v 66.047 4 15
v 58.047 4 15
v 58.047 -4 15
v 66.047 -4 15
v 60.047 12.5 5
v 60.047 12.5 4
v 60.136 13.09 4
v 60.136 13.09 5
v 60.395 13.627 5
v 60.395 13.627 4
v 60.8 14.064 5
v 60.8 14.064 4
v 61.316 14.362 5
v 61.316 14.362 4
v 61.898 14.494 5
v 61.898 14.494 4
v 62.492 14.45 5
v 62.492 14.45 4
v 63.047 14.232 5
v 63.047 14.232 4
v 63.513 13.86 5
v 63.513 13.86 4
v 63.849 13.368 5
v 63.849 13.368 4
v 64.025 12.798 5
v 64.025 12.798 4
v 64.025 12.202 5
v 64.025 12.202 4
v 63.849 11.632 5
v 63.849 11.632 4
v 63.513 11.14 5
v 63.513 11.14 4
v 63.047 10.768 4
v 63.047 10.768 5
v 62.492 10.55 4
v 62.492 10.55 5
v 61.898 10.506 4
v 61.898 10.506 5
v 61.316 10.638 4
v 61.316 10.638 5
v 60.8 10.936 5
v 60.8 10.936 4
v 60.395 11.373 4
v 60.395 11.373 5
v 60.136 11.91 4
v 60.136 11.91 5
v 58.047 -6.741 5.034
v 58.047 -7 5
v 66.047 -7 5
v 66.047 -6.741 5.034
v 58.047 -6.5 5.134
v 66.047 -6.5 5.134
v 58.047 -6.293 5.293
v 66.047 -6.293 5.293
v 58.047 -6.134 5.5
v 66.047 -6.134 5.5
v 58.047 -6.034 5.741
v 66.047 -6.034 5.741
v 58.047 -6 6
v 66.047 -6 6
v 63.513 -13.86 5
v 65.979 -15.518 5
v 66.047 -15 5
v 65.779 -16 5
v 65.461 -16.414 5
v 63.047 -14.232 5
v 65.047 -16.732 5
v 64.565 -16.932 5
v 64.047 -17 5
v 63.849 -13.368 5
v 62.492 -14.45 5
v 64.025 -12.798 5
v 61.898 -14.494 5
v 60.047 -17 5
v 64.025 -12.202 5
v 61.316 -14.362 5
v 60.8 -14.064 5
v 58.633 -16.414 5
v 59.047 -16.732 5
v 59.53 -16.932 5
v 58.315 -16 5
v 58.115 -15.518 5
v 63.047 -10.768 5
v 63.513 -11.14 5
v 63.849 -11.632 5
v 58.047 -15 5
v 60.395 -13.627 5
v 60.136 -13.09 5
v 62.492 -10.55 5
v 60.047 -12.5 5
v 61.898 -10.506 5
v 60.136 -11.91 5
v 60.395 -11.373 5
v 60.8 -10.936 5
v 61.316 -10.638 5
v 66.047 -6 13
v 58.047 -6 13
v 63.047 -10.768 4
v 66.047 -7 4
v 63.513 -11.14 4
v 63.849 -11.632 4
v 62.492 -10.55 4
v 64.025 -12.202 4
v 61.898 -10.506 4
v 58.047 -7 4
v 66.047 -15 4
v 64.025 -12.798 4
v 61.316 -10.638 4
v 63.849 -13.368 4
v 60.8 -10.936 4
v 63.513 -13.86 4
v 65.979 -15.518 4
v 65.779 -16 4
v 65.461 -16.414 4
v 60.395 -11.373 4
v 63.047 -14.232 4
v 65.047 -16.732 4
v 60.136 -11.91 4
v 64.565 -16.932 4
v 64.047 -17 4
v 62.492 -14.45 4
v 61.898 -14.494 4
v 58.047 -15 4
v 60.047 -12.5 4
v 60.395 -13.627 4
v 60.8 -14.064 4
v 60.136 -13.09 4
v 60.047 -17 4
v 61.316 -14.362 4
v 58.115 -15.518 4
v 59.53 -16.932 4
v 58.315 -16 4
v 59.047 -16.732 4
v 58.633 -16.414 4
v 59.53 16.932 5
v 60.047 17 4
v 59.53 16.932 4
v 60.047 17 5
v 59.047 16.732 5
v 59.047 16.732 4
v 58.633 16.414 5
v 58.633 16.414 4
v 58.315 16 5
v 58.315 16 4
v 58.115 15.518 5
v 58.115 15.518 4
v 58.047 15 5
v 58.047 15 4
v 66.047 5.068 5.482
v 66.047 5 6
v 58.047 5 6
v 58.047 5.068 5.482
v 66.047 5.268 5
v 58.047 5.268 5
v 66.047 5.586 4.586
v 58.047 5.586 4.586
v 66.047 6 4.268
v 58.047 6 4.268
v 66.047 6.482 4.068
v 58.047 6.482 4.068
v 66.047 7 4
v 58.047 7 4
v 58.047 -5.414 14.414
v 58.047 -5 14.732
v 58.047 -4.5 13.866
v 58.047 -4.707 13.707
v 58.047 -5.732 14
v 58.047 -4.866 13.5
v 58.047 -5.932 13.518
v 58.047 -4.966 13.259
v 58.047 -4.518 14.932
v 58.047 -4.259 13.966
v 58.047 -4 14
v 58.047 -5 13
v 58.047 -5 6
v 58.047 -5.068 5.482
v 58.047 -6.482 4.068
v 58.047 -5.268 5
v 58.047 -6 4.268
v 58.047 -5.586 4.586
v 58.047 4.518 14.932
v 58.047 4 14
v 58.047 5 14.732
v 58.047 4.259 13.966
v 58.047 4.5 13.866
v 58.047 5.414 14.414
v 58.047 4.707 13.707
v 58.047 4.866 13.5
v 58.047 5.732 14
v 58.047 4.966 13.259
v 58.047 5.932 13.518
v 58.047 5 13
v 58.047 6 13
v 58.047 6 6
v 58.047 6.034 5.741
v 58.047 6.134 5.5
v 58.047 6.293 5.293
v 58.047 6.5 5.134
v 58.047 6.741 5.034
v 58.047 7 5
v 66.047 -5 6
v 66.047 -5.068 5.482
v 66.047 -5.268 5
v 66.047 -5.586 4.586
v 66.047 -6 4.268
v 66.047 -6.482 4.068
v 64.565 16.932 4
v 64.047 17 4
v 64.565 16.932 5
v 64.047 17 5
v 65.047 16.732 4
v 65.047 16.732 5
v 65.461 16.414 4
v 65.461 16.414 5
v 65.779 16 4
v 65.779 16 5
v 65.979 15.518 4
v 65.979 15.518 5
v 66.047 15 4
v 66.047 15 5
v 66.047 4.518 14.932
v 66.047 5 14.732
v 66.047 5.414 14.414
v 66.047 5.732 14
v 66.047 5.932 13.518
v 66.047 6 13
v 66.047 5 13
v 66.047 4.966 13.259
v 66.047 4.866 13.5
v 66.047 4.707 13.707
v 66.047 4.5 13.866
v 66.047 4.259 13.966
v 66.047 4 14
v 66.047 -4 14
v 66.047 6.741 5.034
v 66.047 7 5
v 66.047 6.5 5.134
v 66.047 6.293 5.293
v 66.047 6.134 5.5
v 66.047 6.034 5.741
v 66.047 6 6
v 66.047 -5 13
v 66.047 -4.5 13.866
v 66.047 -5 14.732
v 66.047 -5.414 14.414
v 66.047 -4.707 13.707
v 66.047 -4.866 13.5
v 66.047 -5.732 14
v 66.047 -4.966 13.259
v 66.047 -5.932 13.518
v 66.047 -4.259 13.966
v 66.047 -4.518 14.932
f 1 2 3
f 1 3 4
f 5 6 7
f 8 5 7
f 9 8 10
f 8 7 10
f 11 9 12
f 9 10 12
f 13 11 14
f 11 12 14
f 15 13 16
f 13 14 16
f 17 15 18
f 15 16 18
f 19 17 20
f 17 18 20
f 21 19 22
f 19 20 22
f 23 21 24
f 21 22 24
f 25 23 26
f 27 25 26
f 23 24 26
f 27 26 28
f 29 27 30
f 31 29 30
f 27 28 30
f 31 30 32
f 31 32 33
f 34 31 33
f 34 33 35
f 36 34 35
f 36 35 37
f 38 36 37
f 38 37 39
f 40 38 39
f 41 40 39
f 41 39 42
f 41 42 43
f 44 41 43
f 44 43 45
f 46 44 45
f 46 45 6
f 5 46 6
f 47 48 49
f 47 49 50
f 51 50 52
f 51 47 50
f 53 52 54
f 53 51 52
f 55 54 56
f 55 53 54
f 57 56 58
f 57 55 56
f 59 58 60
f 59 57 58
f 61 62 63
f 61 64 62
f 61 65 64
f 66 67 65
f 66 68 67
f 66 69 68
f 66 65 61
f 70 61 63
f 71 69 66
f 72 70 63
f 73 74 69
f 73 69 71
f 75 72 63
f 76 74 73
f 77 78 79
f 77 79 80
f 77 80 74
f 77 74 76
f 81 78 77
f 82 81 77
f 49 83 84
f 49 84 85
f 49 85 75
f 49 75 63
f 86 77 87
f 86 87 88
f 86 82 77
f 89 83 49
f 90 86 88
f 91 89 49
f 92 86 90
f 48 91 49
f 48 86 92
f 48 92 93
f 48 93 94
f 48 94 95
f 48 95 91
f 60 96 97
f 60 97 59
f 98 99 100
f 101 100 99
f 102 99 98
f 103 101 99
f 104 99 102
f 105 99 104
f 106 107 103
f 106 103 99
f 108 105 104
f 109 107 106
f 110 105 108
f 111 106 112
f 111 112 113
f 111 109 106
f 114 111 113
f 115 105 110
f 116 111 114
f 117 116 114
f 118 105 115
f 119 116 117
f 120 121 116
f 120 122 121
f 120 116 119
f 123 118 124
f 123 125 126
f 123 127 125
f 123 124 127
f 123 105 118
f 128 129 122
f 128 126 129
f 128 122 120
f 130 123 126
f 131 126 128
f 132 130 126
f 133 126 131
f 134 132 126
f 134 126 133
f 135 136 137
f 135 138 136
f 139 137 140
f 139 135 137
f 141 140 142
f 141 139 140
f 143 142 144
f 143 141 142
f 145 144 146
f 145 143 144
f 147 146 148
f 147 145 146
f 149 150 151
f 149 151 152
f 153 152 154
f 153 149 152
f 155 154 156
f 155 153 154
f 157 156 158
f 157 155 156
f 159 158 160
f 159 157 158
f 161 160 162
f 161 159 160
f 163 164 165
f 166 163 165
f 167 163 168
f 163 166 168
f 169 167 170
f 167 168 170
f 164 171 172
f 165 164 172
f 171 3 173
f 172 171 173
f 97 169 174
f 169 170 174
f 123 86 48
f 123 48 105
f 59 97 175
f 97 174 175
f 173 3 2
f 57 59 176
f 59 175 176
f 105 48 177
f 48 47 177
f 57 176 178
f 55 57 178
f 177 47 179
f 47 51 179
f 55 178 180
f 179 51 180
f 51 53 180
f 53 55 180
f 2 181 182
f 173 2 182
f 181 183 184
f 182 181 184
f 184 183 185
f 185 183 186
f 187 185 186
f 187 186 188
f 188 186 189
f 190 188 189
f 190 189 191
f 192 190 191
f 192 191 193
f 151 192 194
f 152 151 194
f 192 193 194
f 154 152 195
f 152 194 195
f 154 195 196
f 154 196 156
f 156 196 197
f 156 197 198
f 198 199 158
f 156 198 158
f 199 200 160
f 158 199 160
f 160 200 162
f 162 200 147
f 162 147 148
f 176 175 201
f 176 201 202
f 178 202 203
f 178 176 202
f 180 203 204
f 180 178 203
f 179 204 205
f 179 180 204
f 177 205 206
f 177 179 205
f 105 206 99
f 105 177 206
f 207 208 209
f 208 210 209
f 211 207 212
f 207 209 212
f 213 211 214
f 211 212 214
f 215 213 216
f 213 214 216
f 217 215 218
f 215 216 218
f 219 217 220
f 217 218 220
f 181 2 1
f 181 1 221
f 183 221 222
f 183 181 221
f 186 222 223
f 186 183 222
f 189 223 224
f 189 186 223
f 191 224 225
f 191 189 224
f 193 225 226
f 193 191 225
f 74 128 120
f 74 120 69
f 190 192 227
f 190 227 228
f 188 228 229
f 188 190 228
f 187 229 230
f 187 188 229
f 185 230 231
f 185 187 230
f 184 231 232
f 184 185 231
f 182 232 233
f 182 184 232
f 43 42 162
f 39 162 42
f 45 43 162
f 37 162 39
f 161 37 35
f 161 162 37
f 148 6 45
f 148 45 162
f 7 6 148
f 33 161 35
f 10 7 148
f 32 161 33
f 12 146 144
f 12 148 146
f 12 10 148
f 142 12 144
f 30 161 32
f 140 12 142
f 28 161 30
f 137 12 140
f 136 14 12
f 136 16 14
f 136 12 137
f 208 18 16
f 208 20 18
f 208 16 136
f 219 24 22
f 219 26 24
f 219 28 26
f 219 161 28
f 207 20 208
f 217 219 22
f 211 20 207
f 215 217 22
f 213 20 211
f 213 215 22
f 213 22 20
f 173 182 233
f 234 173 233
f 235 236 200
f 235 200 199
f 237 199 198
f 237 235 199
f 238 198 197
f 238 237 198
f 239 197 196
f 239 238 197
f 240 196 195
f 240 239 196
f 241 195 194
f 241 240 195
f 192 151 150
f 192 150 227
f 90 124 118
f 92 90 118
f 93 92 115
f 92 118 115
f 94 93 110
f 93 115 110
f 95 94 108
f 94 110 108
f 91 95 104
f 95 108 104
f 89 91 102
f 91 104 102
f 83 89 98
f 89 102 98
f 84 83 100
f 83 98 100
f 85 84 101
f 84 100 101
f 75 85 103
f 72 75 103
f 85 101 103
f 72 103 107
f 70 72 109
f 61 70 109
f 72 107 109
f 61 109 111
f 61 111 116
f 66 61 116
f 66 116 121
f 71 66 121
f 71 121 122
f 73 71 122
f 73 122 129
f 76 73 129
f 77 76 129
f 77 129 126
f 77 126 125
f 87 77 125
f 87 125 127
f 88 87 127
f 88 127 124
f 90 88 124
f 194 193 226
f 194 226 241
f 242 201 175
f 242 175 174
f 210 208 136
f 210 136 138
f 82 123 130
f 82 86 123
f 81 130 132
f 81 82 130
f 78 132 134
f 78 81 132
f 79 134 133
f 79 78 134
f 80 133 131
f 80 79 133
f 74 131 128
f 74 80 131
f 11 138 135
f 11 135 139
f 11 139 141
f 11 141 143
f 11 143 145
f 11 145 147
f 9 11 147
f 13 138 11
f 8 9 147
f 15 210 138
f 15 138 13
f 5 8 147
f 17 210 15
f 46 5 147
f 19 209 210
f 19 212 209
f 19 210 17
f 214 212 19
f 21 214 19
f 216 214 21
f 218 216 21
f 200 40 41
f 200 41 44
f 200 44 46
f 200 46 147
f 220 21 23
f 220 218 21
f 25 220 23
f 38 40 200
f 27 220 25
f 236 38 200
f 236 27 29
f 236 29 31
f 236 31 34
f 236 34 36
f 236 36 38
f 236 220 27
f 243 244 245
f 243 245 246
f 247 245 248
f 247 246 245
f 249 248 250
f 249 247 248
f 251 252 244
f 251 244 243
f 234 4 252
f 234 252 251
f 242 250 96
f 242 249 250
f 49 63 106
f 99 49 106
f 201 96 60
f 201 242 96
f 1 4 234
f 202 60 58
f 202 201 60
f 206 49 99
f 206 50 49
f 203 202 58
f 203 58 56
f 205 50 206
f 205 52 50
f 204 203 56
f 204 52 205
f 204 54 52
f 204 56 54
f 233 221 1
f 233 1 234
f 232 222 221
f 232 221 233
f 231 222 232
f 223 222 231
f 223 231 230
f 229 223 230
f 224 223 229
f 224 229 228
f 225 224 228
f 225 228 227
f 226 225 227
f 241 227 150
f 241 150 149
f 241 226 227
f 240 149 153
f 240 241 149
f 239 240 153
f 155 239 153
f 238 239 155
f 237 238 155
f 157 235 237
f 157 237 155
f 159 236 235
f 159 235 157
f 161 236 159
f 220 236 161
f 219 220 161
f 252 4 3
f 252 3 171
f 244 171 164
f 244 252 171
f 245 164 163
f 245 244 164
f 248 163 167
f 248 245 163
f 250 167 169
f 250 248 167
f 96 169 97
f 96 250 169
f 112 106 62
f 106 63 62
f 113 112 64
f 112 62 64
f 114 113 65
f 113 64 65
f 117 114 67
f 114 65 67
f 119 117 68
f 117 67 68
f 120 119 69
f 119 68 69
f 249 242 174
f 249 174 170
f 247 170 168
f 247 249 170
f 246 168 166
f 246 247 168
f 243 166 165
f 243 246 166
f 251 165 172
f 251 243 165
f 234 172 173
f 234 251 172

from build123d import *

# Parameters (mm, degrees)
SKETCH_3_W                         = 8
SKETCH_3_H                         = 10
SM_BASE_FLANGE_1_DEPTH             = 1
SM_EDGE_FLANGE_1_STRIP_W           = 6
SM_EDGE_FLANGE_1_STRIP_H           = 1
SM_EDGE_FLANGE_1_STRIP_CUT_DEPTH   = 8
SM_EDGE_FLANGE_1_STRIP_2_W         = 6
SM_EDGE_FLANGE_1_STRIP_2_H         = 1
SM_EDGE_FLANGE_1_STRIP_CUT_2_DEPTH = 8
SM_EDGE_FLANGE_1_DEPTH             = 8
SM_EDGE_FLANGE_1_BEND_DEPTH        = 8
SM_EDGE_FLANGE_2_STRIP_W           = 6
SM_EDGE_FLANGE_2_STRIP_H           = 1
SM_EDGE_FLANGE_2_STRIP_CUT_DEPTH   = 8
SM_EDGE_FLANGE_2_DEPTH             = 8
SM_EDGE_FLANGE_3_STRIP_W           = 6
SM_EDGE_FLANGE_3_STRIP_H           = 1
SM_EDGE_FLANGE_3_STRIP_CUT_DEPTH   = 8
SM_EDGE_FLANGE_3_DEPTH             = 8
FILLET_1_R                         = 2
HOLE_WIZARD_4_0_4_1_D              = 4


# Sheet-metal steps are written as plain solids
with BuildPart() as part:
    # 草图3 → 基体-法兰1 (new body)
    with BuildSketch(Plane.XY.offset(15)):
        with Locations((62.047155018, 0)):
            Rectangle(SKETCH_3_W, SKETCH_3_H)
    extrude(amount=-SM_BASE_FLANGE_1_DEPTH)

    # 边线-法兰1 strip (across the edge) → 边线-法兰1 strip cut (cut)
    with BuildSketch(Plane(origin=(66.047155018, -5, 14), x_dir=(0, 1, 0), z_dir=(-1, 0, 0))):
        with Locations((-2, -0.5)):
            Rectangle(SM_EDGE_FLANGE_1_STRIP_W, SM_EDGE_FLANGE_1_STRIP_H)
    extrude(amount=SM_EDGE_FLANGE_1_STRIP_CUT_DEPTH, mode=Mode.SUBTRACT)

    # 边线-法兰1 strip 2 (across the edge) → 边线-法兰1 strip cut 2 (cut)
    with BuildSketch(Plane(origin=(58.047155018, 5, 14), x_dir=(0, -1, 0), z_dir=(1, 0, 0))):
        with Locations((-2, -0.5)):
            Rectangle(SM_EDGE_FLANGE_1_STRIP_2_W, SM_EDGE_FLANGE_1_STRIP_2_H)
    extrude(amount=SM_EDGE_FLANGE_1_STRIP_CUT_2_DEPTH, mode=Mode.SUBTRACT)

    # 边线-法兰1 section (across the edge) → 边线-法兰1 (add)
    with BuildSketch(Plane(origin=(66.047155018, -5, 14), x_dir=(0, 1, 0), z_dir=(-1, 0, 0))):
        with BuildLine():
            Line((-1, 1), (-1, 9))
            Line((-1, 9), (0, 9))
            Line((0, 9), (0, 1))
            ThreePointArc((0, 1), (0.292893219, 0.292893219), (1, 0))
            Line((1, 0), (1, -1))
            ThreePointArc((1, -1), (-0.414213562, -0.414213562), (-1, 1))
        make_face()
    extrude(amount=SM_EDGE_FLANGE_1_DEPTH)

    # 边线-法兰1 section 2 (across the edge) → 边线-法兰1 bend (add)
    with BuildSketch(Plane(origin=(58.047155018, 5, 14), x_dir=(0, -1, 0), z_dir=(1, 0, 0))):
        with BuildLine():
            Line((-1, 1), (-1, 9))
            Line((-1, 9), (0, 9))
            Line((0, 9), (0, 1))
            ThreePointArc((0, 1), (0.292893219, 0.292893219), (1, 0))
            Line((1, 0), (1, -1))
            ThreePointArc((1, -1), (-0.414213562, -0.414213562), (-1, 1))
        make_face()
    extrude(amount=SM_EDGE_FLANGE_1_BEND_DEPTH)

    # 边线-法兰2 strip (across the edge) → 边线-法兰2 strip cut (cut)
    with BuildSketch(Plane(origin=(58.047155018, -6, 5), x_dir=(0, 0, 1), z_dir=(1, 0, 0))):
        with Locations((-2, -0.5)):
            Rectangle(SM_EDGE_FLANGE_2_STRIP_W, SM_EDGE_FLANGE_2_STRIP_H)
    extrude(amount=SM_EDGE_FLANGE_2_STRIP_CUT_DEPTH, mode=Mode.SUBTRACT)

    # 边线-法兰2 section (across the edge) → 边线-法兰2 (add)
    with BuildSketch(Plane(origin=(58.047155018, -6, 5), x_dir=(0, 0, 1), z_dir=(1, 0, 0))):
        with BuildLine():
            Line((-1, 1), (-1, 11))
            Line((-1, 11), (0, 11))
            Line((0, 11), (0, 1))
            ThreePointArc((0, 1), (0.292893219, 0.292893219), (1, 0))
            Line((1, 0), (1, -1))
            ThreePointArc((1, -1), (-0.414213562, -0.414213562), (-1, 1))
        make_face()
    extrude(amount=SM_EDGE_FLANGE_2_DEPTH)

    # 边线-法兰3 strip (across the edge) → 边线-法兰3 strip cut (cut)
    with BuildSketch(Plane(origin=(66.047155018, 6, 5), x_dir=(0, 0, 1), z_dir=(-1, 0, 0))):
        with Locations((-2, -0.5)):
            Rectangle(SM_EDGE_FLANGE_3_STRIP_W, SM_EDGE_FLANGE_3_STRIP_H)
    extrude(amount=SM_EDGE_FLANGE_3_STRIP_CUT_DEPTH, mode=Mode.SUBTRACT)

    # 边线-法兰3 section (across the edge) → 边线-法兰3 (add)
    with BuildSketch(Plane(origin=(66.047155018, 6, 5), x_dir=(0, 0, 1), z_dir=(-1, 0, 0))):
        with BuildLine():
            Line((-1, 1), (-1, 11))
            Line((-1, 11), (0, 11))
            Line((0, 11), (0, 1))
            ThreePointArc((0, 1), (0.292893219, 0.292893219), (1, 0))
            Line((1, 0), (1, -1))
            ThreePointArc((1, -1), (-0.414213562, -0.414213562), (-1, 1))
        make_face()
    extrude(amount=SM_EDGE_FLANGE_3_DEPTH)

    # 圆角1
    fillet_1_edges = [part.edges().sort_by_distance(p)[0] for p in [
        (58.047155018, -17, 4.5),
        (66.047155018, -17, 4.5),
        (66.047155018, 17, 4.5),
        (58.047155018, 17, 4.5),
    ]]
    fillet(fillet_1_edges, radius=FILLET_1_R)

    # Ø4.0 (4) 直径孔1 (through all)
    with Locations(Plane.XY.offset(5)):
        with Locations((62.047155018, 12.5), (62.047155018, -12.5)):
            Hole(HOLE_WIZARD_4_0_4_1_D / 2)


solid = part.part
